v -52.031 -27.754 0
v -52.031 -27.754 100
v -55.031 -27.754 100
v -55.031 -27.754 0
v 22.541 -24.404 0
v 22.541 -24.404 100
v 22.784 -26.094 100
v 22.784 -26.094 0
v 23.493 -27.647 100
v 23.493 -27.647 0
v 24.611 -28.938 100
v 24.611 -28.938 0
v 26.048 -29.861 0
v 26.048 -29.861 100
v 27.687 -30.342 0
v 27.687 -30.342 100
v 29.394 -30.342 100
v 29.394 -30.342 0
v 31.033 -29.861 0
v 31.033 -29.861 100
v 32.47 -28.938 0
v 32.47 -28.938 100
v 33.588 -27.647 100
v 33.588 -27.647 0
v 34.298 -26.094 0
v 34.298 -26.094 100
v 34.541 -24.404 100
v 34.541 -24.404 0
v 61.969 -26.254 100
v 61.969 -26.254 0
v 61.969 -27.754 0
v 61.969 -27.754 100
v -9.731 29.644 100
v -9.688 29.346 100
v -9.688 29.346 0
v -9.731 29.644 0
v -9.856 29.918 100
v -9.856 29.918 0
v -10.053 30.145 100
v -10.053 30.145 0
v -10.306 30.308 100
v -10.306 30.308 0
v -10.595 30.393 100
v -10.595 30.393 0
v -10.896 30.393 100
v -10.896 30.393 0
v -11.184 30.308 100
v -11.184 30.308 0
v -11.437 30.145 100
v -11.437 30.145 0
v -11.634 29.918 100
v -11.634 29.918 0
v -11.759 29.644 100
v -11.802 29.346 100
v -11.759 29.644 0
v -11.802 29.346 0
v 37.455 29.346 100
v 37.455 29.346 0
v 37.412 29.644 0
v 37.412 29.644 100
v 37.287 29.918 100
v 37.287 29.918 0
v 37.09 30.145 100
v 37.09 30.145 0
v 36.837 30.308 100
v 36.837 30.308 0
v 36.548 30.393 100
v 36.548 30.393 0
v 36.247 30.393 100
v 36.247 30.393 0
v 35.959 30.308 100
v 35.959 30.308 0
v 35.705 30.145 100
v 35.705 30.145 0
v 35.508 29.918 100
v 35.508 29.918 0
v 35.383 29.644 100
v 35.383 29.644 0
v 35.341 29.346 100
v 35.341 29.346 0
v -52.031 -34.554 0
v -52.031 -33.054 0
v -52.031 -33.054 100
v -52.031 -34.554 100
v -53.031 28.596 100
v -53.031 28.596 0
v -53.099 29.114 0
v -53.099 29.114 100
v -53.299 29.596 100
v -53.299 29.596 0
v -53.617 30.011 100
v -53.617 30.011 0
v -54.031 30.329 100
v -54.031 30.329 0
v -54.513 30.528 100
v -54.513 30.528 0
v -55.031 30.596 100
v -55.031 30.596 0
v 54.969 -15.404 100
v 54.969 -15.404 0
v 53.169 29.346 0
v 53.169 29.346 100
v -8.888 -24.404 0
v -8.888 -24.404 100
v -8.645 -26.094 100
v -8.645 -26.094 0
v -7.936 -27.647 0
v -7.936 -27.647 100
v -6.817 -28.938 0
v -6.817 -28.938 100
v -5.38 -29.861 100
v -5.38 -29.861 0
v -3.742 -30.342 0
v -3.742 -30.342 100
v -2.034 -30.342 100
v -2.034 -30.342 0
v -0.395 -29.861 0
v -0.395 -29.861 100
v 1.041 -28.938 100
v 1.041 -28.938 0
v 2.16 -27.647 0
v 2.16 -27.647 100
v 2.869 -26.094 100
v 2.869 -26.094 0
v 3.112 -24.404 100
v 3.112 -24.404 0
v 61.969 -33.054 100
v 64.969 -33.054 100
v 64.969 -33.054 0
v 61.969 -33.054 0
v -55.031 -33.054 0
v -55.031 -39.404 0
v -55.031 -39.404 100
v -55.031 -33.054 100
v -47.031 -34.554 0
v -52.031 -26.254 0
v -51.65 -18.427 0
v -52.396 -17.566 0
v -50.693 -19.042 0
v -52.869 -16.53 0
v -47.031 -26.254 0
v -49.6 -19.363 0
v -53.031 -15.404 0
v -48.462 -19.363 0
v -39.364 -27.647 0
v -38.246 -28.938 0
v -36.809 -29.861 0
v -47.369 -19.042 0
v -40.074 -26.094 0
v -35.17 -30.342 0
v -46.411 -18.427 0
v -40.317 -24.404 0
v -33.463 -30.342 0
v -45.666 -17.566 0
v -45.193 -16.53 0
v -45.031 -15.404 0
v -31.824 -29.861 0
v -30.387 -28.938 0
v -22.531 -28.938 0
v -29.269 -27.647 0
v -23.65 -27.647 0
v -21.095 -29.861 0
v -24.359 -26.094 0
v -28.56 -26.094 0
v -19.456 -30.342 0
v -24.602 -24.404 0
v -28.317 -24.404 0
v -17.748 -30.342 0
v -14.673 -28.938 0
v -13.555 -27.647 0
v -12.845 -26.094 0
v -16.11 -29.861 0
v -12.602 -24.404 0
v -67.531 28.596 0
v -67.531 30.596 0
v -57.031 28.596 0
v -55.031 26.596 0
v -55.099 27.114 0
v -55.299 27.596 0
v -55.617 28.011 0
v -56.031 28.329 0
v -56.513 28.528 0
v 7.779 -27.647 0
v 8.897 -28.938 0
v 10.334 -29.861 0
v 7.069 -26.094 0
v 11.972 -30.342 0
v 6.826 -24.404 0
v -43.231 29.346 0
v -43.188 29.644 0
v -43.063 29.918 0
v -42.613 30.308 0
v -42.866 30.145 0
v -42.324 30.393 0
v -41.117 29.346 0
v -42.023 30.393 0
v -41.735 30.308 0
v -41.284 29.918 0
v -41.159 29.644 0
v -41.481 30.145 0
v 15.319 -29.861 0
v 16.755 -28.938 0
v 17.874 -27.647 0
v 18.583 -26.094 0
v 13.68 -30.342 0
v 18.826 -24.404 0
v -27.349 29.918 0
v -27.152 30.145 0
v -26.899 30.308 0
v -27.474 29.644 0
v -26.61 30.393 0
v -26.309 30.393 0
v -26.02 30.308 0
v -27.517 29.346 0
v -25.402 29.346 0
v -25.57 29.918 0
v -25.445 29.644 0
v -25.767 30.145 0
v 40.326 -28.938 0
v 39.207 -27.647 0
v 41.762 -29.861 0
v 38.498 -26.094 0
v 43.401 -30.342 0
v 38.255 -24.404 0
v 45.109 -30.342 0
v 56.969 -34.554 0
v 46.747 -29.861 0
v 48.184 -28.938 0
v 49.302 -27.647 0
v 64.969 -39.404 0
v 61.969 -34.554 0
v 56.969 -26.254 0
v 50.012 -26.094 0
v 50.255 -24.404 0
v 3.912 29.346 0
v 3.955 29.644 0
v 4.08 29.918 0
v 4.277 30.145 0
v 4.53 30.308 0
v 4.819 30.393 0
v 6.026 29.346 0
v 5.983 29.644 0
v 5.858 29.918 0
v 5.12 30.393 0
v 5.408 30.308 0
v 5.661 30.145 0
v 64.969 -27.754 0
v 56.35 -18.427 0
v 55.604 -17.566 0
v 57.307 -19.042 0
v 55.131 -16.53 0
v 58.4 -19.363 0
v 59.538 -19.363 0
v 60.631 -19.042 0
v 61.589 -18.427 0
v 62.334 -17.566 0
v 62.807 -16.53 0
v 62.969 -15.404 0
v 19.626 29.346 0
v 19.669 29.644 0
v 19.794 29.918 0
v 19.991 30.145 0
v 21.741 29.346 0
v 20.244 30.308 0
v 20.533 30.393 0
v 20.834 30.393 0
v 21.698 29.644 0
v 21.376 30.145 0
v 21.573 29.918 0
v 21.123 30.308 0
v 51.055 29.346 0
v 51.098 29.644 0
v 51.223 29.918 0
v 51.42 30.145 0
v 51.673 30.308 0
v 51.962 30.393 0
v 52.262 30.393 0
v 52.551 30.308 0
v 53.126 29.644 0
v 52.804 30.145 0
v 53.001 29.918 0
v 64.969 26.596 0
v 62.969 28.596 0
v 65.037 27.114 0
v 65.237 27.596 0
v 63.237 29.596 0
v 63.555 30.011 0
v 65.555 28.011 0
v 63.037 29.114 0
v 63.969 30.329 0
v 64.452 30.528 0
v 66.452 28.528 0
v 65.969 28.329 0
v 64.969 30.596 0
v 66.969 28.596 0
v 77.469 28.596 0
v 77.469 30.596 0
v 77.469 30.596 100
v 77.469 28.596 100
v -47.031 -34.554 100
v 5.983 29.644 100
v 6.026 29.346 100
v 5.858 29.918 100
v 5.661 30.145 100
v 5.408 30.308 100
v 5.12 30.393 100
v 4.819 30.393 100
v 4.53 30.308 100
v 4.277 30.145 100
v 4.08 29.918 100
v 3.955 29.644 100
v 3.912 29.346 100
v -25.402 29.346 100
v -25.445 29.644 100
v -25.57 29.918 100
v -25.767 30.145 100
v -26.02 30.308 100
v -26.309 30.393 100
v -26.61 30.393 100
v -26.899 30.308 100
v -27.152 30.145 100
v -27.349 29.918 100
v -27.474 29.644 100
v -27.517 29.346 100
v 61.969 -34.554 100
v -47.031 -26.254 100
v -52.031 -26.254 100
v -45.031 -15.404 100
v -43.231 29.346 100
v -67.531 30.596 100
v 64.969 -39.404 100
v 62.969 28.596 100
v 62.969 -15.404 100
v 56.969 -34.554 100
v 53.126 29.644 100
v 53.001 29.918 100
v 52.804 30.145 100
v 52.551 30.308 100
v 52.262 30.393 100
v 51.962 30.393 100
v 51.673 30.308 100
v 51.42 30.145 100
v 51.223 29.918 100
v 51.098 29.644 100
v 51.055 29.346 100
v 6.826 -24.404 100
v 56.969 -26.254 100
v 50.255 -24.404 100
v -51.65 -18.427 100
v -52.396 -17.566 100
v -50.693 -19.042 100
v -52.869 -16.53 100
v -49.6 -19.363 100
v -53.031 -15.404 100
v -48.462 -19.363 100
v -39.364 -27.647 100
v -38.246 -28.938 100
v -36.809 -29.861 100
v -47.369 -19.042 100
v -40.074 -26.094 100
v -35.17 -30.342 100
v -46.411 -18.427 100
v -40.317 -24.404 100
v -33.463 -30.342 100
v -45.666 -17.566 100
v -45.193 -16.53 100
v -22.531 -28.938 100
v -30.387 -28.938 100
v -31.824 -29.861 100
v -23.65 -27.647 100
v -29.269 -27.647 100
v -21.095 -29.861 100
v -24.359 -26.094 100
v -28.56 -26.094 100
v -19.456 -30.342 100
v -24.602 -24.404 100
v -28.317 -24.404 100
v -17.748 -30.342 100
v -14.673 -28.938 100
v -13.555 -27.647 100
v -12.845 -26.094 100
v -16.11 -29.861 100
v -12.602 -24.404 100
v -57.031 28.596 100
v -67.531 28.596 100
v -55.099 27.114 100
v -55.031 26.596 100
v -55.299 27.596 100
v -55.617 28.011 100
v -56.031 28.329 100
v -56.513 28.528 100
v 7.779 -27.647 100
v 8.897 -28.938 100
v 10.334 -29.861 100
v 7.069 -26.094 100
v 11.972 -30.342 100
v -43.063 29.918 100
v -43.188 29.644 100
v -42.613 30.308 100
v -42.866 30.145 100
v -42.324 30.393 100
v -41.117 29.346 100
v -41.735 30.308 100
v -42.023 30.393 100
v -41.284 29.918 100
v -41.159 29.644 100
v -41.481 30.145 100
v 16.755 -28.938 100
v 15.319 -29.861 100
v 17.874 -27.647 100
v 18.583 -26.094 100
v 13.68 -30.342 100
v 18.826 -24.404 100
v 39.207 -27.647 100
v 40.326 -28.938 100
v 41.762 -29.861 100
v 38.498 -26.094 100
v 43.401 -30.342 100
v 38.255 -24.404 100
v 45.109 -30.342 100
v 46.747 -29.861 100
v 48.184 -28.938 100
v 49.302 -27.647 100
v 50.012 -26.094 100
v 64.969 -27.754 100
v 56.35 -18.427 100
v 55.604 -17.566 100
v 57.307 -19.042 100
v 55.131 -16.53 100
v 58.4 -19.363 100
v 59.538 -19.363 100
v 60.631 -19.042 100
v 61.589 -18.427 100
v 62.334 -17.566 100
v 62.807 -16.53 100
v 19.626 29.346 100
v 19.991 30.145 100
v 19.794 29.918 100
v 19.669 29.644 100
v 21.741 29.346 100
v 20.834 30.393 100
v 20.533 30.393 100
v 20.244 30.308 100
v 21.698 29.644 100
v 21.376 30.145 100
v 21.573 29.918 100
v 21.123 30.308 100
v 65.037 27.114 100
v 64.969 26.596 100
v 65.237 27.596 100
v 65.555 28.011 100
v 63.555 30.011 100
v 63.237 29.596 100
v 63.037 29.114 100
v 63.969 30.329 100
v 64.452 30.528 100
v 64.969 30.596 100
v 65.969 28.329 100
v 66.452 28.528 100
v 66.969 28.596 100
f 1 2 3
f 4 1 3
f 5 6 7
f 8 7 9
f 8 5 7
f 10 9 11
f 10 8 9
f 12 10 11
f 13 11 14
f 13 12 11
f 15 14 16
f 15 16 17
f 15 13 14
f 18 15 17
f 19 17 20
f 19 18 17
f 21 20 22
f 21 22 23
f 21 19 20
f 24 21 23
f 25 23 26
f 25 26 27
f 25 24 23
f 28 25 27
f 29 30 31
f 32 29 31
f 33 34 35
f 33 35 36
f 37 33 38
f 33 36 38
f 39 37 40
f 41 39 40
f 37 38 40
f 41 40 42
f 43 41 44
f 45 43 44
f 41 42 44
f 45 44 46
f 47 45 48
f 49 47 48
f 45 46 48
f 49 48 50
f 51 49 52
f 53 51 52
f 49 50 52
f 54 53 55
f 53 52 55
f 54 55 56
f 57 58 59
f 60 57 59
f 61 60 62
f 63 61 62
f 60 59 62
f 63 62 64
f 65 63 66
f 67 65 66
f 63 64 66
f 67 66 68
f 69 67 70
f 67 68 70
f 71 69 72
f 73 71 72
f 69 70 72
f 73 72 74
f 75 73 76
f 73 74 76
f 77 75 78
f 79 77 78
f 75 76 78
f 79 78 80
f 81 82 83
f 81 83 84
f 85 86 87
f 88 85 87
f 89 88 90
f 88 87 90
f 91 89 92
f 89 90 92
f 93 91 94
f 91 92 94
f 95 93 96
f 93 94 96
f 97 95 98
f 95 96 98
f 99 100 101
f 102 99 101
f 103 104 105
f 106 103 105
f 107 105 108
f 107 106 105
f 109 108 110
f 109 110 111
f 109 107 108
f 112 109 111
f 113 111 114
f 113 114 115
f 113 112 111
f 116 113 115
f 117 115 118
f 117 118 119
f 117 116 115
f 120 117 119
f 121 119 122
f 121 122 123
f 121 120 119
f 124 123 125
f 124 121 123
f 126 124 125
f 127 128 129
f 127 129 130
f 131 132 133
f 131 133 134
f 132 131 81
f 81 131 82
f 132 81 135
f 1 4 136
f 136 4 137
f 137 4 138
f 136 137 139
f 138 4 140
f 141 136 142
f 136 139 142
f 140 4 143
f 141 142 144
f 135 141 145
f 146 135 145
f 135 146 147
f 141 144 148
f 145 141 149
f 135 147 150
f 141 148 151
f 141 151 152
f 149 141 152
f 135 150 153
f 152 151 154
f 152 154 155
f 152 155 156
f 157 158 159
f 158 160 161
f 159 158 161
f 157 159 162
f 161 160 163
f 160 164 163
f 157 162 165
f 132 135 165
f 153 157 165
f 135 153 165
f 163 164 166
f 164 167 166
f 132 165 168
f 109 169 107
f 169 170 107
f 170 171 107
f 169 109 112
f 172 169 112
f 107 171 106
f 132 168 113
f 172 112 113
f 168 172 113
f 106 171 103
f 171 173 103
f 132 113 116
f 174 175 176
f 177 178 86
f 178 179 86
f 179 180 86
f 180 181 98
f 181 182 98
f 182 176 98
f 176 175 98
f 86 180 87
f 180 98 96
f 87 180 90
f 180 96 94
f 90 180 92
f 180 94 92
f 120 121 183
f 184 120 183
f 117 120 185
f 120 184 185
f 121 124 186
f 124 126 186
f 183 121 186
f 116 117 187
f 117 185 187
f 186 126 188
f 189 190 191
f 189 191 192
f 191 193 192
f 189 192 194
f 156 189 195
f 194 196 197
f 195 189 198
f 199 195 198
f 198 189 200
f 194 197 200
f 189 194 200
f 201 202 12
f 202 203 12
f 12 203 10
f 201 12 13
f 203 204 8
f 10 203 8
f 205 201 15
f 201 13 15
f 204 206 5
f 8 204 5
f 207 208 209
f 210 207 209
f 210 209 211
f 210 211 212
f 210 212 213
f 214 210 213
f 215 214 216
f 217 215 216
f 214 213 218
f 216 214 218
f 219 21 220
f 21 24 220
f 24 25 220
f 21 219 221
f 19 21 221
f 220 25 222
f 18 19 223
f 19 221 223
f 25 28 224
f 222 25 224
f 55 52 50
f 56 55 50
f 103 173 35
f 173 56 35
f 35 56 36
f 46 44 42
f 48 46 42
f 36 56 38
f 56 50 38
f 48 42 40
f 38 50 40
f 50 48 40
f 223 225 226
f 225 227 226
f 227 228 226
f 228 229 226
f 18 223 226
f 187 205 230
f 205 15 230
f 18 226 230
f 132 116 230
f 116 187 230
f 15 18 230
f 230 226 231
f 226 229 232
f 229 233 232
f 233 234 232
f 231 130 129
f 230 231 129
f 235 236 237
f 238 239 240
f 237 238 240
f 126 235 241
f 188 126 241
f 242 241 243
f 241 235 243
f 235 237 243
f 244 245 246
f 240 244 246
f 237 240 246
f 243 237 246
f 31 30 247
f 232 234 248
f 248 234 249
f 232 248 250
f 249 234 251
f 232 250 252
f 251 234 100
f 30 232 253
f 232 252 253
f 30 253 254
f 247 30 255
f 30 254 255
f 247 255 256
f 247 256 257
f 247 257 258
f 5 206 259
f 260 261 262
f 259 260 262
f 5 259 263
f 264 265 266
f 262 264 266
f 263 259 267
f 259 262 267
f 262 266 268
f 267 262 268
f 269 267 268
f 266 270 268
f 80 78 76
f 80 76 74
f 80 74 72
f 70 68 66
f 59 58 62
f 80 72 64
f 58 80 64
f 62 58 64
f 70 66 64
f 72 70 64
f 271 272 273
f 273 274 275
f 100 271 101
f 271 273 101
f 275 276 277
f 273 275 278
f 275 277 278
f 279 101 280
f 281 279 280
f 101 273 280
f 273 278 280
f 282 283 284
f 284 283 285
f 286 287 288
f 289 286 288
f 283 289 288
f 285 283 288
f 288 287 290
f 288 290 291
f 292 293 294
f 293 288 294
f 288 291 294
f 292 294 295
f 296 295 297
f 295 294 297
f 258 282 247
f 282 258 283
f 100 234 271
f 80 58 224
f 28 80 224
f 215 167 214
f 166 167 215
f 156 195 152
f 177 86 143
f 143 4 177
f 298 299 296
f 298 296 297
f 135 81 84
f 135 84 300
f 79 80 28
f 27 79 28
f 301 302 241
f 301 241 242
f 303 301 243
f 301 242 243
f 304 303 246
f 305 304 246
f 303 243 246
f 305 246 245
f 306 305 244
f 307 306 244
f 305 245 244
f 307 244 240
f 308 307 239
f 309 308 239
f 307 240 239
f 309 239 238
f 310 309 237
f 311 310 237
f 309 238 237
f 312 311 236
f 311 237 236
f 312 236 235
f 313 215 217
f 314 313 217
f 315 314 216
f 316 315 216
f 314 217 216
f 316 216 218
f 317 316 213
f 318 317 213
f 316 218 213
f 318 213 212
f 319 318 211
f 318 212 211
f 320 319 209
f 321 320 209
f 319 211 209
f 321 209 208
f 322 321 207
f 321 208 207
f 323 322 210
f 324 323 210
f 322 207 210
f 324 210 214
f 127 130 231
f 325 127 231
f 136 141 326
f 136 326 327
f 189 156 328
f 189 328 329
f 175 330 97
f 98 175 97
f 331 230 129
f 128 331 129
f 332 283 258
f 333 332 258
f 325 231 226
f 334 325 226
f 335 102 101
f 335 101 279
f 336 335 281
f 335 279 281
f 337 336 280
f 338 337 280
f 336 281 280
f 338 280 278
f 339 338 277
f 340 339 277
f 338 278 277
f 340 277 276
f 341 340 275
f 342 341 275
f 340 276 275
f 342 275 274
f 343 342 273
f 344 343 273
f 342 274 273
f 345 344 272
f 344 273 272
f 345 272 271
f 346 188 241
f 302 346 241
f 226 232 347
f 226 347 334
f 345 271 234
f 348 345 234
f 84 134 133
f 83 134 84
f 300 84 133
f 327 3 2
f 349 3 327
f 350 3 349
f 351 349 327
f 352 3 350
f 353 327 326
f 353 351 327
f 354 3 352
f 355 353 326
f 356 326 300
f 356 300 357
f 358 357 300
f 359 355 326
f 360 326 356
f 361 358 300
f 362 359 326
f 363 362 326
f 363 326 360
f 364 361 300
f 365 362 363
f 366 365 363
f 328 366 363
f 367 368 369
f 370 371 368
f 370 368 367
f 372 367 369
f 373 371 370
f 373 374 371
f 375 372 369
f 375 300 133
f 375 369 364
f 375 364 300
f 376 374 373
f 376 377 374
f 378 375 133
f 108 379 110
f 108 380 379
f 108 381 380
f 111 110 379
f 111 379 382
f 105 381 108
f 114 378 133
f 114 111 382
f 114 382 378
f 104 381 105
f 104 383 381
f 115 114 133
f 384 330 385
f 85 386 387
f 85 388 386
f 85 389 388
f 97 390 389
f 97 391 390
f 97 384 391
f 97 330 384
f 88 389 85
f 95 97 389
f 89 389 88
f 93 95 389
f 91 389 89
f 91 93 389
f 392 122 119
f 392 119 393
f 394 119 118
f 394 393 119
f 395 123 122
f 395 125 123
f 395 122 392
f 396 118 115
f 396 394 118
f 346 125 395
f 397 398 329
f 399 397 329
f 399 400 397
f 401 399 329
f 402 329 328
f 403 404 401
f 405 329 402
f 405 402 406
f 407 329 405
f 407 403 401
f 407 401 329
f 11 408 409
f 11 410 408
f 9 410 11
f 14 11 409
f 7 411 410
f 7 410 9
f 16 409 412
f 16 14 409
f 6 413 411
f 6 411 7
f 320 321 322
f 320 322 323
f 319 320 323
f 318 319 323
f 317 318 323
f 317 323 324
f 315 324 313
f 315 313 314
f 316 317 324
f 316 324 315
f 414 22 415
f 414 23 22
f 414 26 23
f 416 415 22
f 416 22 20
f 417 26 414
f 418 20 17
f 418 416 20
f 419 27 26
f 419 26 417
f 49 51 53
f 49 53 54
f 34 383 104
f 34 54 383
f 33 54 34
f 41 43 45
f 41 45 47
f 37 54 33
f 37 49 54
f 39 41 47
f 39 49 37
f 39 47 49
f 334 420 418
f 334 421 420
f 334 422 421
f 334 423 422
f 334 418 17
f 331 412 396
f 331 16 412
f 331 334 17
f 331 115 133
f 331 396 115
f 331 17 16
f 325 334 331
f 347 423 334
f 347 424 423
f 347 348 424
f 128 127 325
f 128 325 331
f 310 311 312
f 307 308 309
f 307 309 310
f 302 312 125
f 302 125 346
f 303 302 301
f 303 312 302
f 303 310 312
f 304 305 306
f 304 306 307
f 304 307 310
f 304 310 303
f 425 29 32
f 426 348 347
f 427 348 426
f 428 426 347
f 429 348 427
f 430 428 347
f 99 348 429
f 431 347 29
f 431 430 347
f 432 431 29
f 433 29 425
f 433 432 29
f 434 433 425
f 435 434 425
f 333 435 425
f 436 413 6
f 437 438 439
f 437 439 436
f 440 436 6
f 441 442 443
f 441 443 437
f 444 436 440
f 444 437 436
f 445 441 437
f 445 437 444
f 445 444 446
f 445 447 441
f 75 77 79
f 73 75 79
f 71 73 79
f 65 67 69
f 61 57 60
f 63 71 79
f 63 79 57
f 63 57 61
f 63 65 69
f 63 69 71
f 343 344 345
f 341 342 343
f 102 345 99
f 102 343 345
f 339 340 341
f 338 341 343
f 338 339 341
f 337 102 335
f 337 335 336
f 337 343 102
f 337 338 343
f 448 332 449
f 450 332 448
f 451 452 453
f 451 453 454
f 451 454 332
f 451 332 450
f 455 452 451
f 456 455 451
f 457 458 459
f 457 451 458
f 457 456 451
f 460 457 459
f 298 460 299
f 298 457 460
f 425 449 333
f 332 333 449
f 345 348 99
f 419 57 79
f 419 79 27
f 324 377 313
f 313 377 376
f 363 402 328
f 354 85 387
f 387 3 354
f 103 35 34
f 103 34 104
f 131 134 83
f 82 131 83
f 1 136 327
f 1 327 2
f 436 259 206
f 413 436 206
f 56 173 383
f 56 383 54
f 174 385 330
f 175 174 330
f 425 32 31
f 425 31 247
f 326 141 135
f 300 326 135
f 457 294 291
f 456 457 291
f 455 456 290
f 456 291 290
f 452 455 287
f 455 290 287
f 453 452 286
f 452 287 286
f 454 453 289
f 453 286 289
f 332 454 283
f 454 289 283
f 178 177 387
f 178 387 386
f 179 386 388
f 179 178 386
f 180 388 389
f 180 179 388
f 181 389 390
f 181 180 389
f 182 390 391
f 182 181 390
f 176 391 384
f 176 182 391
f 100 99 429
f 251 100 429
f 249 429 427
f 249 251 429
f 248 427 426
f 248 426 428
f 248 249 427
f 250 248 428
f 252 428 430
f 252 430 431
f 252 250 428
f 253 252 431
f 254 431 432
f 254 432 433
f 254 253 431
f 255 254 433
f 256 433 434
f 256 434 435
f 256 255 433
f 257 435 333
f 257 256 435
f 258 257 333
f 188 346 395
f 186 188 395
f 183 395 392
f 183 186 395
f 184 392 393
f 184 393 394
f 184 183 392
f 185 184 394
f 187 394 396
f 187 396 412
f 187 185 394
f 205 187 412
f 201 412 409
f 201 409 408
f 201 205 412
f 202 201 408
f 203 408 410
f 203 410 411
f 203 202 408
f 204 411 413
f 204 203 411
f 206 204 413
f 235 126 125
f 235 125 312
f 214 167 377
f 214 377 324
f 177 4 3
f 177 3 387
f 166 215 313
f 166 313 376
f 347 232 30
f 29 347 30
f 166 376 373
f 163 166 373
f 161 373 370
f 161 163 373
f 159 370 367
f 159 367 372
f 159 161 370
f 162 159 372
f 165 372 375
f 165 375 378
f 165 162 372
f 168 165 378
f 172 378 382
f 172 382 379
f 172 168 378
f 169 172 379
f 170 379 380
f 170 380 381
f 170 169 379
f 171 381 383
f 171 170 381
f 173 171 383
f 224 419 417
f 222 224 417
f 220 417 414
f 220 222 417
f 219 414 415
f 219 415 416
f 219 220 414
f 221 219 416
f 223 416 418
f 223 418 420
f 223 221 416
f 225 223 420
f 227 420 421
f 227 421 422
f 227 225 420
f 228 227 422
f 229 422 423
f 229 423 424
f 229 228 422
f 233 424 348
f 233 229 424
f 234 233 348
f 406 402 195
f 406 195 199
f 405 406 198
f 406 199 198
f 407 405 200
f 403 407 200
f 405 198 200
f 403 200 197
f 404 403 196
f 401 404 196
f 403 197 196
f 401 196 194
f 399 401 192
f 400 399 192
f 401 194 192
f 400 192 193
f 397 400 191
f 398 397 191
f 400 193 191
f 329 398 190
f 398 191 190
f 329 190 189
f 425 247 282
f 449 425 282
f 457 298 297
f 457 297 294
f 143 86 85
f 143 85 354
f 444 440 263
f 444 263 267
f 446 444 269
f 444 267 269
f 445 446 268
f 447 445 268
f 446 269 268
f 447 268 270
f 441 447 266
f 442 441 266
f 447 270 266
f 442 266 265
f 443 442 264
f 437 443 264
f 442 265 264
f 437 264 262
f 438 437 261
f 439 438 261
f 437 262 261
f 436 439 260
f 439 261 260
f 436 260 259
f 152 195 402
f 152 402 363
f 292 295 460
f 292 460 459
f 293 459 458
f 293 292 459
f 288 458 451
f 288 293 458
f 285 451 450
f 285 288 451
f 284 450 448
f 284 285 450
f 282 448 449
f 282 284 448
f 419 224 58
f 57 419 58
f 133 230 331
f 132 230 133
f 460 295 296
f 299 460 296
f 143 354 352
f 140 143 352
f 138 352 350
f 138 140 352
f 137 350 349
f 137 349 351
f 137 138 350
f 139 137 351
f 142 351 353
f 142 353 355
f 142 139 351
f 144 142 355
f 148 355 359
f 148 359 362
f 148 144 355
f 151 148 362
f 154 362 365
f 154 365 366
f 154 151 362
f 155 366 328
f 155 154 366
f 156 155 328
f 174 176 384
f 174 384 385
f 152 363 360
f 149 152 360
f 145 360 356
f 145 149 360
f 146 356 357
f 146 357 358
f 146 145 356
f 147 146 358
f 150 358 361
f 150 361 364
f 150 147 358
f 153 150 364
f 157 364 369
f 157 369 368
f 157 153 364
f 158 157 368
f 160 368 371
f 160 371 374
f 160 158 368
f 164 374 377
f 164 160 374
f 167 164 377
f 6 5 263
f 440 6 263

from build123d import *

# Parameters (mm, degrees)
PAD_DEPTH = 100


with BuildPart() as part:
    # Sketch002 → Pad (new body)
    with BuildSketch(Plane.XY):
        with BuildLine():
            Line((64.96916, -39.403533), (64.96916, -33.053533))
            Line((64.96916, -33.053533), (61.96916, -33.053533))
            Line((61.96916, -33.053533), (61.96916, -34.553533))
            Line((61.96916, -34.553533), (56.96916, -34.553533))
            Line((56.96916, -30.403533), (56.96916, -34.553533))
            Line((56.96916, -26.253533), (56.96916, -30.403533))
            Line((56.96916, -26.253533), (61.96916, -26.253533))
            Line((61.96916, -26.253533), (61.96916, -27.753533))
            Line((61.96916, -27.753533), (64.96916, -27.753533))
            Line((64.96916, -27.753533), (64.96916, 26.596467))
            ThreePointArc((66.96916, 28.596467), (65.554946, 28.010681), (64.96916, 26.596467))
            Line((66.96916, 28.596467), (77.46916, 28.596467))
            Line((77.46916, 28.596467), (77.46916, 30.596467))
            Line((77.46916, 30.596467), (64.96916, 30.596467))
            ThreePointArc((64.96916, 30.596467), (63.554946, 30.010681), (62.96916, 28.596467))
            Line((62.96916, 28.596467), (62.96916, -15.403533))
            ThreePointArc((54.96916, -15.403533), (58.96916, -19.403533), (62.96916, -15.403533))
            Line((54.96916, -15.403533), (53.16916, 29.346467))
            ThreePointArc((53.16916, 29.346467), (52.112017, 30.40361), (51.054874, 29.346467))
            Line((51.054874, 29.346467), (50.254874, -24.403533))
            ThreePointArc((38.254874, -24.403533), (44.254874, -30.403533), (50.254874, -24.403533))
            Line((38.254874, -24.403533), (37.454874, 29.346467))
            ThreePointArc((37.454874, 29.346467), (36.397731, 30.40361), (35.340589, 29.346467))
            Line((35.340589, 29.346467), (34.540589, -24.403533))
            ThreePointArc((22.540589, -24.403533), (28.540589, -30.403533), (34.540589, -24.403533))
            Line((22.540589, -24.403533), (21.740589, 29.346467))
            ThreePointArc((21.740589, 29.346467), (20.683446, 30.40361), (19.626303, 29.346467))
            Line((19.626303, 29.346467), (18.826303, -24.403533))
            ThreePointArc((6.826303, -24.403533), (12.826303, -30.403533), (18.826303, -24.403533))
            Line((6.826303, -24.403533), (6.026303, 29.346467))
            ThreePointArc((6.026303, 29.346467), (4.96916, 30.40361), (3.912017, 29.346467))
            Line((3.112017, -24.403533), (3.912017, 29.346467))
            ThreePointArc((-8.887983, -24.403533), (-2.887983, -30.403533), (3.112017, -24.403533))
            Line((-9.687983, 29.346467), (-8.887983, -24.403533))
            ThreePointArc((-9.687983, 29.346467), (-10.745126, 30.40361), (-11.802269, 29.346467))
            Line((-12.602269, -24.403533), (-11.802269, 29.346467))
            ThreePointArc((-24.602269, -24.403533), (-18.602269, -30.403533), (-12.602269, -24.403533))
            Line((-25.402269, 29.346467), (-24.602269, -24.403533))
            ThreePointArc((-25.402269, 29.346467), (-26.459411, 30.40361), (-27.516554, 29.346467))
            Line((-28.316554, -24.403533), (-27.516554, 29.346467))
            ThreePointArc((-40.316554, -24.403533), (-34.316554, -30.403533), (-28.316554, -24.403533))
            Line((-41.116554, 29.346467), (-40.316554, -24.403533))
            ThreePointArc((-41.116554, 29.346467), (-42.173697, 30.40361), (-43.23084, 29.346467))
            Line((-45.03084, -15.403533), (-43.23084, 29.346467))
            ThreePointArc((-53.03084, -15.403533), (-49.03084, -19.403533), (-45.03084, -15.403533))
            Line((-53.03084, 28.596467), (-53.03084, -15.403533))
            ThreePointArc((-53.03084, 28.596467), (-53.616626, 30.010681), (-55.03084, 30.596467))
            Line((-67.53084, 30.596467), (-55.03084, 30.596467))
            Line((-67.53084, 28.596467), (-67.53084, 30.596467))
            Line((-57.03084, 28.596467), (-67.53084, 28.596467))
            ThreePointArc((-55.03084, 26.596467), (-55.616626, 28.010681), (-57.03084, 28.596467))
            Line((-55.03084, -27.753533), (-55.03084, 26.596467))
            Line((-52.03084, -27.753533), (-55.03084, -27.753533))
            Line((-52.03084, -26.253533), (-52.03084, -27.753533))
            Line((-47.03084, -26.253533), (-52.03084, -26.253533))
            Line((-47.03084, -26.253533), (-47.03084, -30.403533))
            Line((-47.03084, -30.403533), (-47.03084, -34.553533))
            Line((-52.03084, -34.553533), (-47.03084, -34.553533))
            Line((-52.03084, -33.053533), (-52.03084, -34.553533))
            Line((-55.03084, -33.053533), (-52.03084, -33.053533))
            Line((-55.03084, -39.403533), (-55.03084, -33.053533))
            Line((64.96916, -39.403533), (-55.03084, -39.403533))
        make_face()
    extrude(amount=PAD_DEPTH)


solid = part.part
